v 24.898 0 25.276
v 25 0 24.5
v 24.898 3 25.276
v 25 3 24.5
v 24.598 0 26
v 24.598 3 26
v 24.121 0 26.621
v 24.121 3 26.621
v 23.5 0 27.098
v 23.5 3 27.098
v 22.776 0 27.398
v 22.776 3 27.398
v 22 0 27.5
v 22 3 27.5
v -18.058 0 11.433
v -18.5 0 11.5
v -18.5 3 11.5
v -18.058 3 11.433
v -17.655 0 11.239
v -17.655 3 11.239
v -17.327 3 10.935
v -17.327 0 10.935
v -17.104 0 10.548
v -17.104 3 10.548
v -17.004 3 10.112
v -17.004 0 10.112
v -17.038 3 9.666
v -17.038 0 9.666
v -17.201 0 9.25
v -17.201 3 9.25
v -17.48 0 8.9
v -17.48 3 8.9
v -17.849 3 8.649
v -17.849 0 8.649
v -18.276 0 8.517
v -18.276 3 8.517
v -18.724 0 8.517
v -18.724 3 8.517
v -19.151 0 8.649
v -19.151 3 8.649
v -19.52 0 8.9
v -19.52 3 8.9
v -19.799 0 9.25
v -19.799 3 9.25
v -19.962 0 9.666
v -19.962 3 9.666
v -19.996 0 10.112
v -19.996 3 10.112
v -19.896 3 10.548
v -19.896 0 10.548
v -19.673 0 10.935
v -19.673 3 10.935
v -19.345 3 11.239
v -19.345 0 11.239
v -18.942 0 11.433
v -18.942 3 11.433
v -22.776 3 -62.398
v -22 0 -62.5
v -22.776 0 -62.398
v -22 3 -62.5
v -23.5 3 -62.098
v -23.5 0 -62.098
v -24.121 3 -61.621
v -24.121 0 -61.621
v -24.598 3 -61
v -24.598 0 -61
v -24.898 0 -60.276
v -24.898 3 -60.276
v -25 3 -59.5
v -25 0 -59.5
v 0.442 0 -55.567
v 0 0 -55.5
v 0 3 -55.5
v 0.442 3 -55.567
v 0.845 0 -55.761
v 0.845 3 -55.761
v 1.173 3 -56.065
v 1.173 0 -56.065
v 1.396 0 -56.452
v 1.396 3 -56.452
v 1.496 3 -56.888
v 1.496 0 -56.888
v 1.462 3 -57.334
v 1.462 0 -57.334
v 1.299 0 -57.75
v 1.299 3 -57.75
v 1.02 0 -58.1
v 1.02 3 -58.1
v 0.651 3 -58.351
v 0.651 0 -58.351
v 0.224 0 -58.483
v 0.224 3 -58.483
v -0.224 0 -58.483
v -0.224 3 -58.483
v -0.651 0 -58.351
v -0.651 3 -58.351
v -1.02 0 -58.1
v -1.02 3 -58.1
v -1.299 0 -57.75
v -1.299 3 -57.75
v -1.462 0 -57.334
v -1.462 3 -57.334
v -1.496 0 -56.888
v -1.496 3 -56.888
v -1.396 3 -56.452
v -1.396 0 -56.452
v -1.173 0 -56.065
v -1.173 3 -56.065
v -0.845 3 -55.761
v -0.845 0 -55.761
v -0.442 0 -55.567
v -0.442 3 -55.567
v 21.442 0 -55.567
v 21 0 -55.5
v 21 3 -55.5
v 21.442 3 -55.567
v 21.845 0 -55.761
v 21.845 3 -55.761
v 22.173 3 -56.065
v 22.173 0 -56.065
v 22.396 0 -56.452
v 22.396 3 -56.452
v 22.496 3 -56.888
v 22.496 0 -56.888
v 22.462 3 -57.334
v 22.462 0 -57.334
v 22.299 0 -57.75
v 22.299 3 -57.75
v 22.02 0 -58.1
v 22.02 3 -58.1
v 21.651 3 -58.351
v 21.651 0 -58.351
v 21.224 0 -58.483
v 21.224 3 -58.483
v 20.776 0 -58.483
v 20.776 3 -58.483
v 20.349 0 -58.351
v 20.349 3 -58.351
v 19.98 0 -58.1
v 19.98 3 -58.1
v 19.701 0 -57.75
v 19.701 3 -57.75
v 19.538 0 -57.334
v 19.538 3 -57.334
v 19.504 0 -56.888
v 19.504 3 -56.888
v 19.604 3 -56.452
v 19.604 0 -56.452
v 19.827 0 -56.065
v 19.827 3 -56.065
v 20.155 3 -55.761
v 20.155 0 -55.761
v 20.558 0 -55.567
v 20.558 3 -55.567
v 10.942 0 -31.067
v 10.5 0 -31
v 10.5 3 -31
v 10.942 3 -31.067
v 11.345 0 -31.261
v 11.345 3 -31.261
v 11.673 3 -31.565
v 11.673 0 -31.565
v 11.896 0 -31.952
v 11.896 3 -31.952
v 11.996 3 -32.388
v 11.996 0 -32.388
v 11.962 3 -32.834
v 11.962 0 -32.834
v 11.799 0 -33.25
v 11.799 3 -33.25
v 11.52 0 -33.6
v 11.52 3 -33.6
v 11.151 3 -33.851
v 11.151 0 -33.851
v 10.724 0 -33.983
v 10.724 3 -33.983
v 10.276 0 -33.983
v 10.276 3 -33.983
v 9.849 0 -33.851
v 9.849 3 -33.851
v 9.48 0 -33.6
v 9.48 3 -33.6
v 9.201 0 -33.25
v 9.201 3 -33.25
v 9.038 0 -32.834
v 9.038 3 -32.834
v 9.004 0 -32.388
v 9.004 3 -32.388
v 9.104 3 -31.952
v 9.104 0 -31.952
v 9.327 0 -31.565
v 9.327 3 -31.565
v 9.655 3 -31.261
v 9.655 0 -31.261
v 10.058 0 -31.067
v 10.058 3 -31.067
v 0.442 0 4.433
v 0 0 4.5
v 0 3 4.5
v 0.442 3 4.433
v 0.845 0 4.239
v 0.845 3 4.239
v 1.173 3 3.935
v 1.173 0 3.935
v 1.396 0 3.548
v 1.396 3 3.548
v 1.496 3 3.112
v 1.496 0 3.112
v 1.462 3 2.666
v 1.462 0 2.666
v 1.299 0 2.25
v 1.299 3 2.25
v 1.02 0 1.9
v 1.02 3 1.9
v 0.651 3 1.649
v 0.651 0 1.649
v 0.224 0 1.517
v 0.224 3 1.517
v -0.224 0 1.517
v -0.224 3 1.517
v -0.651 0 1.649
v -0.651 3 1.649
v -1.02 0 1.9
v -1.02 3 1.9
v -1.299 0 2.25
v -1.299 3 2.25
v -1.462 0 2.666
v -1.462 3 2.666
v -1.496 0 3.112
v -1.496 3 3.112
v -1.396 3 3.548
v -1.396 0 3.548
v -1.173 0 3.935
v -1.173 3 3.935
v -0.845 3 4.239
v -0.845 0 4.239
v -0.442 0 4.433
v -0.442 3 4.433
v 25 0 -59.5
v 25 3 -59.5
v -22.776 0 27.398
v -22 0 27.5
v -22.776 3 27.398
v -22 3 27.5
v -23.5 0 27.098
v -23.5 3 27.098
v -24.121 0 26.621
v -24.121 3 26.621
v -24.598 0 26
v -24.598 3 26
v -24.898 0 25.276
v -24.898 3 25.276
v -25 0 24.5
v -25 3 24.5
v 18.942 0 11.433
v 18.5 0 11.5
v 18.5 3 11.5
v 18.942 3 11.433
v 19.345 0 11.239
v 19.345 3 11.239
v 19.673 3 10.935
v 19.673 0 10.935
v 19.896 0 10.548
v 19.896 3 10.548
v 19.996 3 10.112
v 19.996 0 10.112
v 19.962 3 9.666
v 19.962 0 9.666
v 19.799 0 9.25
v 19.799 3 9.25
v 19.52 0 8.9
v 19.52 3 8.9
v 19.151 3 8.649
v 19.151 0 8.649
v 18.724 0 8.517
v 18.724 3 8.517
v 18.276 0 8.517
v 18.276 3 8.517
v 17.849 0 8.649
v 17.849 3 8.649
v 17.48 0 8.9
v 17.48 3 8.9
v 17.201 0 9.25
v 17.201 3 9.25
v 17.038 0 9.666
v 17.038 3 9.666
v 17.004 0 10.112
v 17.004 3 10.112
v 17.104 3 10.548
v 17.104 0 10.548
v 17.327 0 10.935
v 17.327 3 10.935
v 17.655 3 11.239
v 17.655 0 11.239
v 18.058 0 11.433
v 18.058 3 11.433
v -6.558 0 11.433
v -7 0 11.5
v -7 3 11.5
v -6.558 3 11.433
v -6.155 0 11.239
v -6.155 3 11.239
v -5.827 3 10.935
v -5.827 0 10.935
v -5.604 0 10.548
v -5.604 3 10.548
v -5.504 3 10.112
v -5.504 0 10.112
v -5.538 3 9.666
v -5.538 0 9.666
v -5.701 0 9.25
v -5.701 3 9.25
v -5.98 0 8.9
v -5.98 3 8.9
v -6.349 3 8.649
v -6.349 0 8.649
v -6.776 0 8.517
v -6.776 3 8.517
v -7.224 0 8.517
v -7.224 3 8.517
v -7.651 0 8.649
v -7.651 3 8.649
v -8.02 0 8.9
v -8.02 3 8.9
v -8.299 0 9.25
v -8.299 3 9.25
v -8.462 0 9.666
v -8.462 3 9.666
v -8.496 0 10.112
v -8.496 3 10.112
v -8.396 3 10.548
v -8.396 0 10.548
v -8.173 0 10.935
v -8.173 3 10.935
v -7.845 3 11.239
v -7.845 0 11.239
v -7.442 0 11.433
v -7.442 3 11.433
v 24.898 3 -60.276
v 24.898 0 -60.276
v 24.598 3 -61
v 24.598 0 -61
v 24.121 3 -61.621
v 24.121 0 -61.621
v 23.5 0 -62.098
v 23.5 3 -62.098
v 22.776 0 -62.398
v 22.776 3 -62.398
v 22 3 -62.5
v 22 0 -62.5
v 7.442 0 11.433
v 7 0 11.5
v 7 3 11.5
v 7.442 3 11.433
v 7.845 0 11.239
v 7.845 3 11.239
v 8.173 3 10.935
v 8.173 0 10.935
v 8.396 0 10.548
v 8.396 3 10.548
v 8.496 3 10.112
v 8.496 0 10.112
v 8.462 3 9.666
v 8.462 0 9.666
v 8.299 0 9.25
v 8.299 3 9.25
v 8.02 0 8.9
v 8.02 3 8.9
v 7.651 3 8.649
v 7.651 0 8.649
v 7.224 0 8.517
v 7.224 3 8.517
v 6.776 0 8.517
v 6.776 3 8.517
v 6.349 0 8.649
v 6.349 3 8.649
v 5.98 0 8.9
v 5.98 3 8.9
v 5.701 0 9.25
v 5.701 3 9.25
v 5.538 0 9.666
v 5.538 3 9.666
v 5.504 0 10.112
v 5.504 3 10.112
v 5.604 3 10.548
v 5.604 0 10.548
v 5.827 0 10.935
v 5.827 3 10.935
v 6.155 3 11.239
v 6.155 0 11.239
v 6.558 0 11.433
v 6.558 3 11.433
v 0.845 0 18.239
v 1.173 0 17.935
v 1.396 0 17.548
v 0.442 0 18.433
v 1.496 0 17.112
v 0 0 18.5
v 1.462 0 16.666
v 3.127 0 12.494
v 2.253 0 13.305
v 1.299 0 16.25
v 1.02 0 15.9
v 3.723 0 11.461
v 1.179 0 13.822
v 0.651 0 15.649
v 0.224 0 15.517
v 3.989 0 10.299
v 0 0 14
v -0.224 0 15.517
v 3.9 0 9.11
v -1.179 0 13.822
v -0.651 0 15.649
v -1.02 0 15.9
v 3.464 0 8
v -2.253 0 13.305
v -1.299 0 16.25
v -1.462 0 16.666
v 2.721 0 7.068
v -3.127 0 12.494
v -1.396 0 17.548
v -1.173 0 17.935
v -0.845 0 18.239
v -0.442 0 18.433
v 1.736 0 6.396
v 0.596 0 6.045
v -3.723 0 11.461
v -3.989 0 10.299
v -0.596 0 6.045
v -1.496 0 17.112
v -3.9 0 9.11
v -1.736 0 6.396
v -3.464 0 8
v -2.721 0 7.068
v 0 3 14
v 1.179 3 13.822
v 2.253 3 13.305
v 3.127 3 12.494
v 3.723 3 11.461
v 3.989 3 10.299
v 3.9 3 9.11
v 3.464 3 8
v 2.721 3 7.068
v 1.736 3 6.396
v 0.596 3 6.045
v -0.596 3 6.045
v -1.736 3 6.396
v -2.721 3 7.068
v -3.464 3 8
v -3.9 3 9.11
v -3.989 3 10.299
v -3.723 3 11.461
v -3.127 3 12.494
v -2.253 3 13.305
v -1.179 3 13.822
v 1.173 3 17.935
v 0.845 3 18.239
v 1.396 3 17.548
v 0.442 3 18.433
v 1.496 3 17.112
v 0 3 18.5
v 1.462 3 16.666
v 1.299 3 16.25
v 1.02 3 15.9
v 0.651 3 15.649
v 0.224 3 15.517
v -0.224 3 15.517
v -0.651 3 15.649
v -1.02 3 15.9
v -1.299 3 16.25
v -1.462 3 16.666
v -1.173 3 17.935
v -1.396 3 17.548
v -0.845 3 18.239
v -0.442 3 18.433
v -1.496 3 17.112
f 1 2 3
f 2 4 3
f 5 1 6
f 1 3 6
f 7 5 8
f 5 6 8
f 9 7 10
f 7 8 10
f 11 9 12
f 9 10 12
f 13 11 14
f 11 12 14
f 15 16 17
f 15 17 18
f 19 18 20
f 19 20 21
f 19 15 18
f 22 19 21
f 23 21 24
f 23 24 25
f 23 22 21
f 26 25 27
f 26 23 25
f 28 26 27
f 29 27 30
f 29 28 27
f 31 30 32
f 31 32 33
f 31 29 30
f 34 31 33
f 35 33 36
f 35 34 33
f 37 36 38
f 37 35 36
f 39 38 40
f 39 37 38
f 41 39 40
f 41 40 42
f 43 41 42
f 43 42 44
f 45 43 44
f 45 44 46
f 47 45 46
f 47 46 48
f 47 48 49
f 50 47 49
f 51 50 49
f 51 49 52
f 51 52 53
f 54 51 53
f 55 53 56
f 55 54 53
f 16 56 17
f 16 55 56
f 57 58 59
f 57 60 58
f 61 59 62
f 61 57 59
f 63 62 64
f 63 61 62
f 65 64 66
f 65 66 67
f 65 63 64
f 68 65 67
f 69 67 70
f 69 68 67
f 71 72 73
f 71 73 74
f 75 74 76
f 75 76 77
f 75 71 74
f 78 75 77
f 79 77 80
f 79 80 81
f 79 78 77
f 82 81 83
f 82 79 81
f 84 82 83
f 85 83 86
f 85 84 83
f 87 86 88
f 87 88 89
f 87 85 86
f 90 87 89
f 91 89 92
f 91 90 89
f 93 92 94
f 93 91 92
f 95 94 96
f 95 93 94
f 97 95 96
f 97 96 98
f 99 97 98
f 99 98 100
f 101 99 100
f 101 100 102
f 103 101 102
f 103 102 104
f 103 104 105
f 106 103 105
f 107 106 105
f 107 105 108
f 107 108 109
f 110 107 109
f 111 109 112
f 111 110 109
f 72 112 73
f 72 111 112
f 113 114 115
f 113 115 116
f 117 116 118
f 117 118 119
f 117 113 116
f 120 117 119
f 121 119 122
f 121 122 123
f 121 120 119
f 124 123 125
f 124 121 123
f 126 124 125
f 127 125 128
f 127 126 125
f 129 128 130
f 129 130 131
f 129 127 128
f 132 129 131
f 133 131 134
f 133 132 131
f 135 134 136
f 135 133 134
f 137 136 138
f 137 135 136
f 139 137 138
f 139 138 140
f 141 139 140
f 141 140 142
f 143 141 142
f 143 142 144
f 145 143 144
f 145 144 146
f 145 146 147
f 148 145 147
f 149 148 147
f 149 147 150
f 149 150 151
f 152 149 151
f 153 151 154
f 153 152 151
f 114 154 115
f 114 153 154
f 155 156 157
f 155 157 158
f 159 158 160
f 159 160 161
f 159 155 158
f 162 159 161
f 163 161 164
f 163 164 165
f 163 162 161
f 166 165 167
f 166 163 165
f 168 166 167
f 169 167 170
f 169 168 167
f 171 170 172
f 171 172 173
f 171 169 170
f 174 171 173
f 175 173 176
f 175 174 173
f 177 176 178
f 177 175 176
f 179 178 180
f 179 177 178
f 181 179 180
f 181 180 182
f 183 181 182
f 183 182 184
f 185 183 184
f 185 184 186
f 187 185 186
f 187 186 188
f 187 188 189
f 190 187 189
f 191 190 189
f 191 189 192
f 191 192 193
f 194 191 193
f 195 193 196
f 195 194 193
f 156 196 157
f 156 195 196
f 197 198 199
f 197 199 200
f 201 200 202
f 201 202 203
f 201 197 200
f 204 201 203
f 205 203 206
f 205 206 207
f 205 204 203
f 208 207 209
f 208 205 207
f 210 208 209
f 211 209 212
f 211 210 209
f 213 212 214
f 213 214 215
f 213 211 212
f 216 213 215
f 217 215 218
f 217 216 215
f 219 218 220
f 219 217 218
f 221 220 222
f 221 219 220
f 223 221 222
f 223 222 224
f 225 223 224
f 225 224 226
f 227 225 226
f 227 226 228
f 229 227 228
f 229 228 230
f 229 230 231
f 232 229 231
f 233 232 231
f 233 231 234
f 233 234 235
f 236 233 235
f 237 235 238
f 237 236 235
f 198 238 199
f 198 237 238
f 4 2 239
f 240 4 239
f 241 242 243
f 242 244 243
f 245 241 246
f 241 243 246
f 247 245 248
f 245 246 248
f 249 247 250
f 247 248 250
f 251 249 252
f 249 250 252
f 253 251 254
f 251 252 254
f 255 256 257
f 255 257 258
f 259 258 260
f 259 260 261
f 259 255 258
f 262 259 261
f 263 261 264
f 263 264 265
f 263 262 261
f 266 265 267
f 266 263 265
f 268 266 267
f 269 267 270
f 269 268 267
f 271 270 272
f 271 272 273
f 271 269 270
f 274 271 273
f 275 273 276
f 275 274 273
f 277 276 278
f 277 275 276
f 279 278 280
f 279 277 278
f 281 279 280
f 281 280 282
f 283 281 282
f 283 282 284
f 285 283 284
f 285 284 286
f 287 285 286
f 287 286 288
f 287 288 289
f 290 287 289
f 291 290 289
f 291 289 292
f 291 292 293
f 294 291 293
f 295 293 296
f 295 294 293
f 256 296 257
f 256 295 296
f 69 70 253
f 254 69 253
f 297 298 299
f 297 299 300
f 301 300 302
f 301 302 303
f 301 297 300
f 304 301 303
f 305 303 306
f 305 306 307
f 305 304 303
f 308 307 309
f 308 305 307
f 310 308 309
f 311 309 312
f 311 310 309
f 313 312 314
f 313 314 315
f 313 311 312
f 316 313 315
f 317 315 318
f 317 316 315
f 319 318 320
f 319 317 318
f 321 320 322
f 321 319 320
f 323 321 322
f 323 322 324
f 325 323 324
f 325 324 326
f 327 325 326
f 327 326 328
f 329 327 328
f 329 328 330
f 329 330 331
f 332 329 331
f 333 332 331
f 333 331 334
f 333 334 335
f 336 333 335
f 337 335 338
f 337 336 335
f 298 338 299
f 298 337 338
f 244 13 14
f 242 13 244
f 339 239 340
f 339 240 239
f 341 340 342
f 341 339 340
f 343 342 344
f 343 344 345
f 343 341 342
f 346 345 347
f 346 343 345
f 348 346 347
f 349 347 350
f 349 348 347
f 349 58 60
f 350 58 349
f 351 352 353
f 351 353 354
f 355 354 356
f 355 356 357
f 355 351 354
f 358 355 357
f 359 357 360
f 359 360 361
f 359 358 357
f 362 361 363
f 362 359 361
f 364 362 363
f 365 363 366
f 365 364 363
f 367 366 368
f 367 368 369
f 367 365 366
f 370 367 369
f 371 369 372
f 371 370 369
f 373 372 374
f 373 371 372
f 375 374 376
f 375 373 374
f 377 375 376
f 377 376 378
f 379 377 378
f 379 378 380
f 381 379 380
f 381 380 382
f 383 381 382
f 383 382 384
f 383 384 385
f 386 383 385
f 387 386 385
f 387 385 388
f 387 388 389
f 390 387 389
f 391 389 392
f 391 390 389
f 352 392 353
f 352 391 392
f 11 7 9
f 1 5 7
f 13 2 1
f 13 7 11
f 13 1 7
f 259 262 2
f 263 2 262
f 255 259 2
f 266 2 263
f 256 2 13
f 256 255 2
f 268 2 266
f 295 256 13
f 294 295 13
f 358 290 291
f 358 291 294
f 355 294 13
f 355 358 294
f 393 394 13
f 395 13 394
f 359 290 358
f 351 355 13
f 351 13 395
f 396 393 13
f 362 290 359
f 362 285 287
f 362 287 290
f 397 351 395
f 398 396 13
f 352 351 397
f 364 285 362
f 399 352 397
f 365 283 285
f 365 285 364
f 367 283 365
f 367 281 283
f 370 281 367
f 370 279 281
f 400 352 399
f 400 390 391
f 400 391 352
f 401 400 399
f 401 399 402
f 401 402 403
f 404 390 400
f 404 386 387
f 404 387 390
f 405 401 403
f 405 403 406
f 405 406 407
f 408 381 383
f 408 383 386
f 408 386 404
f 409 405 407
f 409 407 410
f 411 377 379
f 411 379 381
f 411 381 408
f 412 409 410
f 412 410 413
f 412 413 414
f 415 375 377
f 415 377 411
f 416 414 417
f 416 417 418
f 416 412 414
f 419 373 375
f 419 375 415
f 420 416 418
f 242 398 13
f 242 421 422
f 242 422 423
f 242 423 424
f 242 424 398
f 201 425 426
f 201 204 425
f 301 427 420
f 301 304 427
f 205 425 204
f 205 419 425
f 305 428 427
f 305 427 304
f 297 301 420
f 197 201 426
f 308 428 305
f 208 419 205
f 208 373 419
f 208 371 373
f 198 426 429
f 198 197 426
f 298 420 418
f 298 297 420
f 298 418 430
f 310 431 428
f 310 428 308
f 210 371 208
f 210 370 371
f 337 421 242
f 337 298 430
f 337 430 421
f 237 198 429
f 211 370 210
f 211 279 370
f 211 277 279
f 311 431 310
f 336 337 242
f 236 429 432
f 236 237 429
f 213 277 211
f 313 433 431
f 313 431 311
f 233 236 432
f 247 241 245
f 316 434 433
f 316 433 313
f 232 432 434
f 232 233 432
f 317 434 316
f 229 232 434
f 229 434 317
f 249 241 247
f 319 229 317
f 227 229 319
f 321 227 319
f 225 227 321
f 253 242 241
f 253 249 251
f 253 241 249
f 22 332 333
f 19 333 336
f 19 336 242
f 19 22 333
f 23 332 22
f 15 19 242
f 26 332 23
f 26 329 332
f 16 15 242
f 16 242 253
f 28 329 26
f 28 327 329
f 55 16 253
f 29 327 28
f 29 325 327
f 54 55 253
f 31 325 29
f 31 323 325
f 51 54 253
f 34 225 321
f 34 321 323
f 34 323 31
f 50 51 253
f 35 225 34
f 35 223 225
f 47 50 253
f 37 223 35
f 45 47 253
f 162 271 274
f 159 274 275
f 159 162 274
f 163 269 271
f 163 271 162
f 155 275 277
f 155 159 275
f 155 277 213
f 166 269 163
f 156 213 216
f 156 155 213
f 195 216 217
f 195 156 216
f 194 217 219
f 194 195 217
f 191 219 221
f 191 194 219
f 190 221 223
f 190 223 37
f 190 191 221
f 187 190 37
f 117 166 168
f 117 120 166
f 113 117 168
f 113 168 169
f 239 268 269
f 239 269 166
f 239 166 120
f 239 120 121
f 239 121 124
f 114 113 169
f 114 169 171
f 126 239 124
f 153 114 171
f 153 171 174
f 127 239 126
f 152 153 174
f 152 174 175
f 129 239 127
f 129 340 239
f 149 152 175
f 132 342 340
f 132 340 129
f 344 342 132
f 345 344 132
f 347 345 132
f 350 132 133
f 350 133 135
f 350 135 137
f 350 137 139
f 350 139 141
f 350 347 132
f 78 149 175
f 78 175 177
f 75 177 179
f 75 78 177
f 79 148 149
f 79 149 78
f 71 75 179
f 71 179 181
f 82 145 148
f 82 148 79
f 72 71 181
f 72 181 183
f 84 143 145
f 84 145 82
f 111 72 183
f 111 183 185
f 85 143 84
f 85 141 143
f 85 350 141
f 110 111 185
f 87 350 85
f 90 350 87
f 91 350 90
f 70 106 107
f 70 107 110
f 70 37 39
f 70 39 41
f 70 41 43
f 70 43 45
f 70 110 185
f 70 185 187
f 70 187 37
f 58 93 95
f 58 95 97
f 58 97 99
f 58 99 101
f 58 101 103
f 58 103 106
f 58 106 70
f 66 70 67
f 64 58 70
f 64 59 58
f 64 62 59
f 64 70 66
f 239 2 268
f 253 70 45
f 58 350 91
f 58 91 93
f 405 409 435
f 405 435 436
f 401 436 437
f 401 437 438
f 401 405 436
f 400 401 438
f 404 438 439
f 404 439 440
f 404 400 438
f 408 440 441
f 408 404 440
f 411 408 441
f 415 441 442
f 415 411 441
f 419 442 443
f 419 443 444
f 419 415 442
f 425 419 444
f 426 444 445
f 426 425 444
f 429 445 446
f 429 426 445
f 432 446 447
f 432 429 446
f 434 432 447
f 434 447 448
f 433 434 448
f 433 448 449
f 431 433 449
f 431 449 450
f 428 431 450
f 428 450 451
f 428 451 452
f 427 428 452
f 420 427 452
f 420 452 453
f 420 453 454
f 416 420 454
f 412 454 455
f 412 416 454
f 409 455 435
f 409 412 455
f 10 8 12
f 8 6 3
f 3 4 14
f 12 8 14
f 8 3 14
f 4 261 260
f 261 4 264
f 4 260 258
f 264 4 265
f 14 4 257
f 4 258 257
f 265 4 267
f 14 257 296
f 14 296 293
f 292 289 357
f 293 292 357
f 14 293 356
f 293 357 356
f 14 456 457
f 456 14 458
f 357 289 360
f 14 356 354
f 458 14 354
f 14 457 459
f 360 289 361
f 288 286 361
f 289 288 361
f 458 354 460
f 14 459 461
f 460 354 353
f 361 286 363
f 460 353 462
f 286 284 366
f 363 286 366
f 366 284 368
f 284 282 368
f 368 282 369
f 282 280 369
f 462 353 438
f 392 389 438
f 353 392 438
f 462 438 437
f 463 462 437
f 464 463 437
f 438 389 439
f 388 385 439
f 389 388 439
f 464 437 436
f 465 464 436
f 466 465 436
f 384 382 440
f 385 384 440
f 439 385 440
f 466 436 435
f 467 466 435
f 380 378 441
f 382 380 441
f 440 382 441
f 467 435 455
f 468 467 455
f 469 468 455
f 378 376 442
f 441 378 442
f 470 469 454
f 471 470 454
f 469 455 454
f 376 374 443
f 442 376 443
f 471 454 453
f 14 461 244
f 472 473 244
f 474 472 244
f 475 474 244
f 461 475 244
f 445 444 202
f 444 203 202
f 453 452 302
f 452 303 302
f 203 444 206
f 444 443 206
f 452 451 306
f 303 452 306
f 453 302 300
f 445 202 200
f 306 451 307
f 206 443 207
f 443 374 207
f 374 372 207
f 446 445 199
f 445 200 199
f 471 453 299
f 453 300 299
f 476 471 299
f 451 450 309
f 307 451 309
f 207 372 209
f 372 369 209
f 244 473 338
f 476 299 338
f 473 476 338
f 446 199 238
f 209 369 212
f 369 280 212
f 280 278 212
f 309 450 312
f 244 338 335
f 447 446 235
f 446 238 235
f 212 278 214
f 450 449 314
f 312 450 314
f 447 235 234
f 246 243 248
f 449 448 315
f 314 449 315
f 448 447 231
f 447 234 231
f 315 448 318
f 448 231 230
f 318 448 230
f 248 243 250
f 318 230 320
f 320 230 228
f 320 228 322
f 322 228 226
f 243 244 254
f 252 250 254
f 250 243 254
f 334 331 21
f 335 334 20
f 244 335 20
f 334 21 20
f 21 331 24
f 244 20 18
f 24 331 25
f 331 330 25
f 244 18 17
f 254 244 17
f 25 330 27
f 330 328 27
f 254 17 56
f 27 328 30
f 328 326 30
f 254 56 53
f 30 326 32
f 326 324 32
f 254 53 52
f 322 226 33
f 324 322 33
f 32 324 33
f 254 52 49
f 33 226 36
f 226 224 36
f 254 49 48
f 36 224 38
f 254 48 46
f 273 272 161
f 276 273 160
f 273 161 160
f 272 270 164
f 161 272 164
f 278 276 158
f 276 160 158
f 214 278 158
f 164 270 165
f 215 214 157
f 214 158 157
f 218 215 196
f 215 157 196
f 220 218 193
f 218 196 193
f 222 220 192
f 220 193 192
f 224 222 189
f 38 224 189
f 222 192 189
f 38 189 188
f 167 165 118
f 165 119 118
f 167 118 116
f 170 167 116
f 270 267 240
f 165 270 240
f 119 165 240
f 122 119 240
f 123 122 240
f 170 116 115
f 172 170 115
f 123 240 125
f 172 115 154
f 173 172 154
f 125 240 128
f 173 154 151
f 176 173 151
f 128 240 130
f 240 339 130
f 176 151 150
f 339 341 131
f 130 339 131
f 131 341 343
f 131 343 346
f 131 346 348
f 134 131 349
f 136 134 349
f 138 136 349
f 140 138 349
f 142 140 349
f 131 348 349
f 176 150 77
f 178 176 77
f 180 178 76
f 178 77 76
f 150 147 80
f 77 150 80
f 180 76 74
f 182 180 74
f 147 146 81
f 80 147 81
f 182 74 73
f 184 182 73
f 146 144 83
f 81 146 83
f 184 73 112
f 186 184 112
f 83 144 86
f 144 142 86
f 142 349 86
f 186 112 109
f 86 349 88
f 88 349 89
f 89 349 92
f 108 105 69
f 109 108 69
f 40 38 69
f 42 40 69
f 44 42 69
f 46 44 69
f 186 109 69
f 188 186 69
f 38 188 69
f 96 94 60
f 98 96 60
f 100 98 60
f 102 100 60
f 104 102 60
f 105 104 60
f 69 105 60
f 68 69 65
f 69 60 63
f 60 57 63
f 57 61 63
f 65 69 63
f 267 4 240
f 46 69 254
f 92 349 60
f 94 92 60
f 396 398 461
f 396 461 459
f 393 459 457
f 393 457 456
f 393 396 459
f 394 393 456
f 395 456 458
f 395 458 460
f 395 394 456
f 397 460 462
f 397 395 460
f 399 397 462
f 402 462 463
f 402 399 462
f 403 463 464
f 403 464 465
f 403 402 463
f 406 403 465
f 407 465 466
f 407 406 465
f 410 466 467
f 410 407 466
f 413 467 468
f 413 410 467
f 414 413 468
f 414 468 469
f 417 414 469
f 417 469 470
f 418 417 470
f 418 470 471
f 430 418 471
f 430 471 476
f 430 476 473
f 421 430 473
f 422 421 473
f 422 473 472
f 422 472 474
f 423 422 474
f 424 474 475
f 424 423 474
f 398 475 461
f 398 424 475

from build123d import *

# Parameters (mm, degrees)
SKETCH_1_R      = 1.5
SKETCH_1_R_2    = 4
EXTRUDE_1_DEPTH = 3
FILLET_2_R      = 3


with BuildPart() as part:
    # 草图1 → 凸台-拉伸1 (new body)
    with BuildSketch(Plane(origin=(0, 0, 0), x_dir=(1, 0, 0), z_dir=(0, 1, 0))):
        Polygon((25, 17.5), (25, -27.5), (-25, -27.5), (-25, 17.5), (-25, 62.5), (25, 62.5), align=None)
        with Locations(Location((0, 57, 0), (0, 0, 270))):
            Circle(SKETCH_1_R, mode=Mode.SUBTRACT)
        with Locations(Location((10.5, 32.5, 0), (0, 0, 270))):
            Circle(SKETCH_1_R, mode=Mode.SUBTRACT)
        with Locations(Location((21, 57, 0), (0, 0, 270))):
            Circle(SKETCH_1_R, mode=Mode.SUBTRACT)
        with Locations(Location((0, -10, 0), (0, 0, 270))):
            Circle(SKETCH_1_R_2, mode=Mode.SUBTRACT)
        with Locations(Location((0, -3, 0), (0, 0, 270))):
            Circle(SKETCH_1_R, mode=Mode.SUBTRACT)
        with Locations(Location((-18.5, -10, 0), (0, 0, 270))):
            Circle(SKETCH_1_R, mode=Mode.SUBTRACT)
        with Locations(Location((18.5, -10, 0), (0, 0, 270))):
            Circle(SKETCH_1_R, mode=Mode.SUBTRACT)
        with Locations(Location((7, -10, 0), (0, 0, 270))):
            Circle(SKETCH_1_R, mode=Mode.SUBTRACT)
        with Locations(Location((0, -17, 0), (0, 0, 270))):
            Circle(SKETCH_1_R, mode=Mode.SUBTRACT)
        with Locations(Location((-7, -10, 0), (0, 0, 270))):
            Circle(SKETCH_1_R, mode=Mode.SUBTRACT)
    extrude(amount=EXTRUDE_1_DEPTH)

    # 圆角2
    fillet_2_edges = [part.edges().sort_by_distance(p)[0] for p in [
        (25, 1.5, 27.5),
        (-25, 1.5, 27.5),
        (-25, 1.5, -62.5),
        (25, 1.5, -62.5),
    ]]
    fillet(fillet_2_edges, radius=FILLET_2_R)


solid = part.part
